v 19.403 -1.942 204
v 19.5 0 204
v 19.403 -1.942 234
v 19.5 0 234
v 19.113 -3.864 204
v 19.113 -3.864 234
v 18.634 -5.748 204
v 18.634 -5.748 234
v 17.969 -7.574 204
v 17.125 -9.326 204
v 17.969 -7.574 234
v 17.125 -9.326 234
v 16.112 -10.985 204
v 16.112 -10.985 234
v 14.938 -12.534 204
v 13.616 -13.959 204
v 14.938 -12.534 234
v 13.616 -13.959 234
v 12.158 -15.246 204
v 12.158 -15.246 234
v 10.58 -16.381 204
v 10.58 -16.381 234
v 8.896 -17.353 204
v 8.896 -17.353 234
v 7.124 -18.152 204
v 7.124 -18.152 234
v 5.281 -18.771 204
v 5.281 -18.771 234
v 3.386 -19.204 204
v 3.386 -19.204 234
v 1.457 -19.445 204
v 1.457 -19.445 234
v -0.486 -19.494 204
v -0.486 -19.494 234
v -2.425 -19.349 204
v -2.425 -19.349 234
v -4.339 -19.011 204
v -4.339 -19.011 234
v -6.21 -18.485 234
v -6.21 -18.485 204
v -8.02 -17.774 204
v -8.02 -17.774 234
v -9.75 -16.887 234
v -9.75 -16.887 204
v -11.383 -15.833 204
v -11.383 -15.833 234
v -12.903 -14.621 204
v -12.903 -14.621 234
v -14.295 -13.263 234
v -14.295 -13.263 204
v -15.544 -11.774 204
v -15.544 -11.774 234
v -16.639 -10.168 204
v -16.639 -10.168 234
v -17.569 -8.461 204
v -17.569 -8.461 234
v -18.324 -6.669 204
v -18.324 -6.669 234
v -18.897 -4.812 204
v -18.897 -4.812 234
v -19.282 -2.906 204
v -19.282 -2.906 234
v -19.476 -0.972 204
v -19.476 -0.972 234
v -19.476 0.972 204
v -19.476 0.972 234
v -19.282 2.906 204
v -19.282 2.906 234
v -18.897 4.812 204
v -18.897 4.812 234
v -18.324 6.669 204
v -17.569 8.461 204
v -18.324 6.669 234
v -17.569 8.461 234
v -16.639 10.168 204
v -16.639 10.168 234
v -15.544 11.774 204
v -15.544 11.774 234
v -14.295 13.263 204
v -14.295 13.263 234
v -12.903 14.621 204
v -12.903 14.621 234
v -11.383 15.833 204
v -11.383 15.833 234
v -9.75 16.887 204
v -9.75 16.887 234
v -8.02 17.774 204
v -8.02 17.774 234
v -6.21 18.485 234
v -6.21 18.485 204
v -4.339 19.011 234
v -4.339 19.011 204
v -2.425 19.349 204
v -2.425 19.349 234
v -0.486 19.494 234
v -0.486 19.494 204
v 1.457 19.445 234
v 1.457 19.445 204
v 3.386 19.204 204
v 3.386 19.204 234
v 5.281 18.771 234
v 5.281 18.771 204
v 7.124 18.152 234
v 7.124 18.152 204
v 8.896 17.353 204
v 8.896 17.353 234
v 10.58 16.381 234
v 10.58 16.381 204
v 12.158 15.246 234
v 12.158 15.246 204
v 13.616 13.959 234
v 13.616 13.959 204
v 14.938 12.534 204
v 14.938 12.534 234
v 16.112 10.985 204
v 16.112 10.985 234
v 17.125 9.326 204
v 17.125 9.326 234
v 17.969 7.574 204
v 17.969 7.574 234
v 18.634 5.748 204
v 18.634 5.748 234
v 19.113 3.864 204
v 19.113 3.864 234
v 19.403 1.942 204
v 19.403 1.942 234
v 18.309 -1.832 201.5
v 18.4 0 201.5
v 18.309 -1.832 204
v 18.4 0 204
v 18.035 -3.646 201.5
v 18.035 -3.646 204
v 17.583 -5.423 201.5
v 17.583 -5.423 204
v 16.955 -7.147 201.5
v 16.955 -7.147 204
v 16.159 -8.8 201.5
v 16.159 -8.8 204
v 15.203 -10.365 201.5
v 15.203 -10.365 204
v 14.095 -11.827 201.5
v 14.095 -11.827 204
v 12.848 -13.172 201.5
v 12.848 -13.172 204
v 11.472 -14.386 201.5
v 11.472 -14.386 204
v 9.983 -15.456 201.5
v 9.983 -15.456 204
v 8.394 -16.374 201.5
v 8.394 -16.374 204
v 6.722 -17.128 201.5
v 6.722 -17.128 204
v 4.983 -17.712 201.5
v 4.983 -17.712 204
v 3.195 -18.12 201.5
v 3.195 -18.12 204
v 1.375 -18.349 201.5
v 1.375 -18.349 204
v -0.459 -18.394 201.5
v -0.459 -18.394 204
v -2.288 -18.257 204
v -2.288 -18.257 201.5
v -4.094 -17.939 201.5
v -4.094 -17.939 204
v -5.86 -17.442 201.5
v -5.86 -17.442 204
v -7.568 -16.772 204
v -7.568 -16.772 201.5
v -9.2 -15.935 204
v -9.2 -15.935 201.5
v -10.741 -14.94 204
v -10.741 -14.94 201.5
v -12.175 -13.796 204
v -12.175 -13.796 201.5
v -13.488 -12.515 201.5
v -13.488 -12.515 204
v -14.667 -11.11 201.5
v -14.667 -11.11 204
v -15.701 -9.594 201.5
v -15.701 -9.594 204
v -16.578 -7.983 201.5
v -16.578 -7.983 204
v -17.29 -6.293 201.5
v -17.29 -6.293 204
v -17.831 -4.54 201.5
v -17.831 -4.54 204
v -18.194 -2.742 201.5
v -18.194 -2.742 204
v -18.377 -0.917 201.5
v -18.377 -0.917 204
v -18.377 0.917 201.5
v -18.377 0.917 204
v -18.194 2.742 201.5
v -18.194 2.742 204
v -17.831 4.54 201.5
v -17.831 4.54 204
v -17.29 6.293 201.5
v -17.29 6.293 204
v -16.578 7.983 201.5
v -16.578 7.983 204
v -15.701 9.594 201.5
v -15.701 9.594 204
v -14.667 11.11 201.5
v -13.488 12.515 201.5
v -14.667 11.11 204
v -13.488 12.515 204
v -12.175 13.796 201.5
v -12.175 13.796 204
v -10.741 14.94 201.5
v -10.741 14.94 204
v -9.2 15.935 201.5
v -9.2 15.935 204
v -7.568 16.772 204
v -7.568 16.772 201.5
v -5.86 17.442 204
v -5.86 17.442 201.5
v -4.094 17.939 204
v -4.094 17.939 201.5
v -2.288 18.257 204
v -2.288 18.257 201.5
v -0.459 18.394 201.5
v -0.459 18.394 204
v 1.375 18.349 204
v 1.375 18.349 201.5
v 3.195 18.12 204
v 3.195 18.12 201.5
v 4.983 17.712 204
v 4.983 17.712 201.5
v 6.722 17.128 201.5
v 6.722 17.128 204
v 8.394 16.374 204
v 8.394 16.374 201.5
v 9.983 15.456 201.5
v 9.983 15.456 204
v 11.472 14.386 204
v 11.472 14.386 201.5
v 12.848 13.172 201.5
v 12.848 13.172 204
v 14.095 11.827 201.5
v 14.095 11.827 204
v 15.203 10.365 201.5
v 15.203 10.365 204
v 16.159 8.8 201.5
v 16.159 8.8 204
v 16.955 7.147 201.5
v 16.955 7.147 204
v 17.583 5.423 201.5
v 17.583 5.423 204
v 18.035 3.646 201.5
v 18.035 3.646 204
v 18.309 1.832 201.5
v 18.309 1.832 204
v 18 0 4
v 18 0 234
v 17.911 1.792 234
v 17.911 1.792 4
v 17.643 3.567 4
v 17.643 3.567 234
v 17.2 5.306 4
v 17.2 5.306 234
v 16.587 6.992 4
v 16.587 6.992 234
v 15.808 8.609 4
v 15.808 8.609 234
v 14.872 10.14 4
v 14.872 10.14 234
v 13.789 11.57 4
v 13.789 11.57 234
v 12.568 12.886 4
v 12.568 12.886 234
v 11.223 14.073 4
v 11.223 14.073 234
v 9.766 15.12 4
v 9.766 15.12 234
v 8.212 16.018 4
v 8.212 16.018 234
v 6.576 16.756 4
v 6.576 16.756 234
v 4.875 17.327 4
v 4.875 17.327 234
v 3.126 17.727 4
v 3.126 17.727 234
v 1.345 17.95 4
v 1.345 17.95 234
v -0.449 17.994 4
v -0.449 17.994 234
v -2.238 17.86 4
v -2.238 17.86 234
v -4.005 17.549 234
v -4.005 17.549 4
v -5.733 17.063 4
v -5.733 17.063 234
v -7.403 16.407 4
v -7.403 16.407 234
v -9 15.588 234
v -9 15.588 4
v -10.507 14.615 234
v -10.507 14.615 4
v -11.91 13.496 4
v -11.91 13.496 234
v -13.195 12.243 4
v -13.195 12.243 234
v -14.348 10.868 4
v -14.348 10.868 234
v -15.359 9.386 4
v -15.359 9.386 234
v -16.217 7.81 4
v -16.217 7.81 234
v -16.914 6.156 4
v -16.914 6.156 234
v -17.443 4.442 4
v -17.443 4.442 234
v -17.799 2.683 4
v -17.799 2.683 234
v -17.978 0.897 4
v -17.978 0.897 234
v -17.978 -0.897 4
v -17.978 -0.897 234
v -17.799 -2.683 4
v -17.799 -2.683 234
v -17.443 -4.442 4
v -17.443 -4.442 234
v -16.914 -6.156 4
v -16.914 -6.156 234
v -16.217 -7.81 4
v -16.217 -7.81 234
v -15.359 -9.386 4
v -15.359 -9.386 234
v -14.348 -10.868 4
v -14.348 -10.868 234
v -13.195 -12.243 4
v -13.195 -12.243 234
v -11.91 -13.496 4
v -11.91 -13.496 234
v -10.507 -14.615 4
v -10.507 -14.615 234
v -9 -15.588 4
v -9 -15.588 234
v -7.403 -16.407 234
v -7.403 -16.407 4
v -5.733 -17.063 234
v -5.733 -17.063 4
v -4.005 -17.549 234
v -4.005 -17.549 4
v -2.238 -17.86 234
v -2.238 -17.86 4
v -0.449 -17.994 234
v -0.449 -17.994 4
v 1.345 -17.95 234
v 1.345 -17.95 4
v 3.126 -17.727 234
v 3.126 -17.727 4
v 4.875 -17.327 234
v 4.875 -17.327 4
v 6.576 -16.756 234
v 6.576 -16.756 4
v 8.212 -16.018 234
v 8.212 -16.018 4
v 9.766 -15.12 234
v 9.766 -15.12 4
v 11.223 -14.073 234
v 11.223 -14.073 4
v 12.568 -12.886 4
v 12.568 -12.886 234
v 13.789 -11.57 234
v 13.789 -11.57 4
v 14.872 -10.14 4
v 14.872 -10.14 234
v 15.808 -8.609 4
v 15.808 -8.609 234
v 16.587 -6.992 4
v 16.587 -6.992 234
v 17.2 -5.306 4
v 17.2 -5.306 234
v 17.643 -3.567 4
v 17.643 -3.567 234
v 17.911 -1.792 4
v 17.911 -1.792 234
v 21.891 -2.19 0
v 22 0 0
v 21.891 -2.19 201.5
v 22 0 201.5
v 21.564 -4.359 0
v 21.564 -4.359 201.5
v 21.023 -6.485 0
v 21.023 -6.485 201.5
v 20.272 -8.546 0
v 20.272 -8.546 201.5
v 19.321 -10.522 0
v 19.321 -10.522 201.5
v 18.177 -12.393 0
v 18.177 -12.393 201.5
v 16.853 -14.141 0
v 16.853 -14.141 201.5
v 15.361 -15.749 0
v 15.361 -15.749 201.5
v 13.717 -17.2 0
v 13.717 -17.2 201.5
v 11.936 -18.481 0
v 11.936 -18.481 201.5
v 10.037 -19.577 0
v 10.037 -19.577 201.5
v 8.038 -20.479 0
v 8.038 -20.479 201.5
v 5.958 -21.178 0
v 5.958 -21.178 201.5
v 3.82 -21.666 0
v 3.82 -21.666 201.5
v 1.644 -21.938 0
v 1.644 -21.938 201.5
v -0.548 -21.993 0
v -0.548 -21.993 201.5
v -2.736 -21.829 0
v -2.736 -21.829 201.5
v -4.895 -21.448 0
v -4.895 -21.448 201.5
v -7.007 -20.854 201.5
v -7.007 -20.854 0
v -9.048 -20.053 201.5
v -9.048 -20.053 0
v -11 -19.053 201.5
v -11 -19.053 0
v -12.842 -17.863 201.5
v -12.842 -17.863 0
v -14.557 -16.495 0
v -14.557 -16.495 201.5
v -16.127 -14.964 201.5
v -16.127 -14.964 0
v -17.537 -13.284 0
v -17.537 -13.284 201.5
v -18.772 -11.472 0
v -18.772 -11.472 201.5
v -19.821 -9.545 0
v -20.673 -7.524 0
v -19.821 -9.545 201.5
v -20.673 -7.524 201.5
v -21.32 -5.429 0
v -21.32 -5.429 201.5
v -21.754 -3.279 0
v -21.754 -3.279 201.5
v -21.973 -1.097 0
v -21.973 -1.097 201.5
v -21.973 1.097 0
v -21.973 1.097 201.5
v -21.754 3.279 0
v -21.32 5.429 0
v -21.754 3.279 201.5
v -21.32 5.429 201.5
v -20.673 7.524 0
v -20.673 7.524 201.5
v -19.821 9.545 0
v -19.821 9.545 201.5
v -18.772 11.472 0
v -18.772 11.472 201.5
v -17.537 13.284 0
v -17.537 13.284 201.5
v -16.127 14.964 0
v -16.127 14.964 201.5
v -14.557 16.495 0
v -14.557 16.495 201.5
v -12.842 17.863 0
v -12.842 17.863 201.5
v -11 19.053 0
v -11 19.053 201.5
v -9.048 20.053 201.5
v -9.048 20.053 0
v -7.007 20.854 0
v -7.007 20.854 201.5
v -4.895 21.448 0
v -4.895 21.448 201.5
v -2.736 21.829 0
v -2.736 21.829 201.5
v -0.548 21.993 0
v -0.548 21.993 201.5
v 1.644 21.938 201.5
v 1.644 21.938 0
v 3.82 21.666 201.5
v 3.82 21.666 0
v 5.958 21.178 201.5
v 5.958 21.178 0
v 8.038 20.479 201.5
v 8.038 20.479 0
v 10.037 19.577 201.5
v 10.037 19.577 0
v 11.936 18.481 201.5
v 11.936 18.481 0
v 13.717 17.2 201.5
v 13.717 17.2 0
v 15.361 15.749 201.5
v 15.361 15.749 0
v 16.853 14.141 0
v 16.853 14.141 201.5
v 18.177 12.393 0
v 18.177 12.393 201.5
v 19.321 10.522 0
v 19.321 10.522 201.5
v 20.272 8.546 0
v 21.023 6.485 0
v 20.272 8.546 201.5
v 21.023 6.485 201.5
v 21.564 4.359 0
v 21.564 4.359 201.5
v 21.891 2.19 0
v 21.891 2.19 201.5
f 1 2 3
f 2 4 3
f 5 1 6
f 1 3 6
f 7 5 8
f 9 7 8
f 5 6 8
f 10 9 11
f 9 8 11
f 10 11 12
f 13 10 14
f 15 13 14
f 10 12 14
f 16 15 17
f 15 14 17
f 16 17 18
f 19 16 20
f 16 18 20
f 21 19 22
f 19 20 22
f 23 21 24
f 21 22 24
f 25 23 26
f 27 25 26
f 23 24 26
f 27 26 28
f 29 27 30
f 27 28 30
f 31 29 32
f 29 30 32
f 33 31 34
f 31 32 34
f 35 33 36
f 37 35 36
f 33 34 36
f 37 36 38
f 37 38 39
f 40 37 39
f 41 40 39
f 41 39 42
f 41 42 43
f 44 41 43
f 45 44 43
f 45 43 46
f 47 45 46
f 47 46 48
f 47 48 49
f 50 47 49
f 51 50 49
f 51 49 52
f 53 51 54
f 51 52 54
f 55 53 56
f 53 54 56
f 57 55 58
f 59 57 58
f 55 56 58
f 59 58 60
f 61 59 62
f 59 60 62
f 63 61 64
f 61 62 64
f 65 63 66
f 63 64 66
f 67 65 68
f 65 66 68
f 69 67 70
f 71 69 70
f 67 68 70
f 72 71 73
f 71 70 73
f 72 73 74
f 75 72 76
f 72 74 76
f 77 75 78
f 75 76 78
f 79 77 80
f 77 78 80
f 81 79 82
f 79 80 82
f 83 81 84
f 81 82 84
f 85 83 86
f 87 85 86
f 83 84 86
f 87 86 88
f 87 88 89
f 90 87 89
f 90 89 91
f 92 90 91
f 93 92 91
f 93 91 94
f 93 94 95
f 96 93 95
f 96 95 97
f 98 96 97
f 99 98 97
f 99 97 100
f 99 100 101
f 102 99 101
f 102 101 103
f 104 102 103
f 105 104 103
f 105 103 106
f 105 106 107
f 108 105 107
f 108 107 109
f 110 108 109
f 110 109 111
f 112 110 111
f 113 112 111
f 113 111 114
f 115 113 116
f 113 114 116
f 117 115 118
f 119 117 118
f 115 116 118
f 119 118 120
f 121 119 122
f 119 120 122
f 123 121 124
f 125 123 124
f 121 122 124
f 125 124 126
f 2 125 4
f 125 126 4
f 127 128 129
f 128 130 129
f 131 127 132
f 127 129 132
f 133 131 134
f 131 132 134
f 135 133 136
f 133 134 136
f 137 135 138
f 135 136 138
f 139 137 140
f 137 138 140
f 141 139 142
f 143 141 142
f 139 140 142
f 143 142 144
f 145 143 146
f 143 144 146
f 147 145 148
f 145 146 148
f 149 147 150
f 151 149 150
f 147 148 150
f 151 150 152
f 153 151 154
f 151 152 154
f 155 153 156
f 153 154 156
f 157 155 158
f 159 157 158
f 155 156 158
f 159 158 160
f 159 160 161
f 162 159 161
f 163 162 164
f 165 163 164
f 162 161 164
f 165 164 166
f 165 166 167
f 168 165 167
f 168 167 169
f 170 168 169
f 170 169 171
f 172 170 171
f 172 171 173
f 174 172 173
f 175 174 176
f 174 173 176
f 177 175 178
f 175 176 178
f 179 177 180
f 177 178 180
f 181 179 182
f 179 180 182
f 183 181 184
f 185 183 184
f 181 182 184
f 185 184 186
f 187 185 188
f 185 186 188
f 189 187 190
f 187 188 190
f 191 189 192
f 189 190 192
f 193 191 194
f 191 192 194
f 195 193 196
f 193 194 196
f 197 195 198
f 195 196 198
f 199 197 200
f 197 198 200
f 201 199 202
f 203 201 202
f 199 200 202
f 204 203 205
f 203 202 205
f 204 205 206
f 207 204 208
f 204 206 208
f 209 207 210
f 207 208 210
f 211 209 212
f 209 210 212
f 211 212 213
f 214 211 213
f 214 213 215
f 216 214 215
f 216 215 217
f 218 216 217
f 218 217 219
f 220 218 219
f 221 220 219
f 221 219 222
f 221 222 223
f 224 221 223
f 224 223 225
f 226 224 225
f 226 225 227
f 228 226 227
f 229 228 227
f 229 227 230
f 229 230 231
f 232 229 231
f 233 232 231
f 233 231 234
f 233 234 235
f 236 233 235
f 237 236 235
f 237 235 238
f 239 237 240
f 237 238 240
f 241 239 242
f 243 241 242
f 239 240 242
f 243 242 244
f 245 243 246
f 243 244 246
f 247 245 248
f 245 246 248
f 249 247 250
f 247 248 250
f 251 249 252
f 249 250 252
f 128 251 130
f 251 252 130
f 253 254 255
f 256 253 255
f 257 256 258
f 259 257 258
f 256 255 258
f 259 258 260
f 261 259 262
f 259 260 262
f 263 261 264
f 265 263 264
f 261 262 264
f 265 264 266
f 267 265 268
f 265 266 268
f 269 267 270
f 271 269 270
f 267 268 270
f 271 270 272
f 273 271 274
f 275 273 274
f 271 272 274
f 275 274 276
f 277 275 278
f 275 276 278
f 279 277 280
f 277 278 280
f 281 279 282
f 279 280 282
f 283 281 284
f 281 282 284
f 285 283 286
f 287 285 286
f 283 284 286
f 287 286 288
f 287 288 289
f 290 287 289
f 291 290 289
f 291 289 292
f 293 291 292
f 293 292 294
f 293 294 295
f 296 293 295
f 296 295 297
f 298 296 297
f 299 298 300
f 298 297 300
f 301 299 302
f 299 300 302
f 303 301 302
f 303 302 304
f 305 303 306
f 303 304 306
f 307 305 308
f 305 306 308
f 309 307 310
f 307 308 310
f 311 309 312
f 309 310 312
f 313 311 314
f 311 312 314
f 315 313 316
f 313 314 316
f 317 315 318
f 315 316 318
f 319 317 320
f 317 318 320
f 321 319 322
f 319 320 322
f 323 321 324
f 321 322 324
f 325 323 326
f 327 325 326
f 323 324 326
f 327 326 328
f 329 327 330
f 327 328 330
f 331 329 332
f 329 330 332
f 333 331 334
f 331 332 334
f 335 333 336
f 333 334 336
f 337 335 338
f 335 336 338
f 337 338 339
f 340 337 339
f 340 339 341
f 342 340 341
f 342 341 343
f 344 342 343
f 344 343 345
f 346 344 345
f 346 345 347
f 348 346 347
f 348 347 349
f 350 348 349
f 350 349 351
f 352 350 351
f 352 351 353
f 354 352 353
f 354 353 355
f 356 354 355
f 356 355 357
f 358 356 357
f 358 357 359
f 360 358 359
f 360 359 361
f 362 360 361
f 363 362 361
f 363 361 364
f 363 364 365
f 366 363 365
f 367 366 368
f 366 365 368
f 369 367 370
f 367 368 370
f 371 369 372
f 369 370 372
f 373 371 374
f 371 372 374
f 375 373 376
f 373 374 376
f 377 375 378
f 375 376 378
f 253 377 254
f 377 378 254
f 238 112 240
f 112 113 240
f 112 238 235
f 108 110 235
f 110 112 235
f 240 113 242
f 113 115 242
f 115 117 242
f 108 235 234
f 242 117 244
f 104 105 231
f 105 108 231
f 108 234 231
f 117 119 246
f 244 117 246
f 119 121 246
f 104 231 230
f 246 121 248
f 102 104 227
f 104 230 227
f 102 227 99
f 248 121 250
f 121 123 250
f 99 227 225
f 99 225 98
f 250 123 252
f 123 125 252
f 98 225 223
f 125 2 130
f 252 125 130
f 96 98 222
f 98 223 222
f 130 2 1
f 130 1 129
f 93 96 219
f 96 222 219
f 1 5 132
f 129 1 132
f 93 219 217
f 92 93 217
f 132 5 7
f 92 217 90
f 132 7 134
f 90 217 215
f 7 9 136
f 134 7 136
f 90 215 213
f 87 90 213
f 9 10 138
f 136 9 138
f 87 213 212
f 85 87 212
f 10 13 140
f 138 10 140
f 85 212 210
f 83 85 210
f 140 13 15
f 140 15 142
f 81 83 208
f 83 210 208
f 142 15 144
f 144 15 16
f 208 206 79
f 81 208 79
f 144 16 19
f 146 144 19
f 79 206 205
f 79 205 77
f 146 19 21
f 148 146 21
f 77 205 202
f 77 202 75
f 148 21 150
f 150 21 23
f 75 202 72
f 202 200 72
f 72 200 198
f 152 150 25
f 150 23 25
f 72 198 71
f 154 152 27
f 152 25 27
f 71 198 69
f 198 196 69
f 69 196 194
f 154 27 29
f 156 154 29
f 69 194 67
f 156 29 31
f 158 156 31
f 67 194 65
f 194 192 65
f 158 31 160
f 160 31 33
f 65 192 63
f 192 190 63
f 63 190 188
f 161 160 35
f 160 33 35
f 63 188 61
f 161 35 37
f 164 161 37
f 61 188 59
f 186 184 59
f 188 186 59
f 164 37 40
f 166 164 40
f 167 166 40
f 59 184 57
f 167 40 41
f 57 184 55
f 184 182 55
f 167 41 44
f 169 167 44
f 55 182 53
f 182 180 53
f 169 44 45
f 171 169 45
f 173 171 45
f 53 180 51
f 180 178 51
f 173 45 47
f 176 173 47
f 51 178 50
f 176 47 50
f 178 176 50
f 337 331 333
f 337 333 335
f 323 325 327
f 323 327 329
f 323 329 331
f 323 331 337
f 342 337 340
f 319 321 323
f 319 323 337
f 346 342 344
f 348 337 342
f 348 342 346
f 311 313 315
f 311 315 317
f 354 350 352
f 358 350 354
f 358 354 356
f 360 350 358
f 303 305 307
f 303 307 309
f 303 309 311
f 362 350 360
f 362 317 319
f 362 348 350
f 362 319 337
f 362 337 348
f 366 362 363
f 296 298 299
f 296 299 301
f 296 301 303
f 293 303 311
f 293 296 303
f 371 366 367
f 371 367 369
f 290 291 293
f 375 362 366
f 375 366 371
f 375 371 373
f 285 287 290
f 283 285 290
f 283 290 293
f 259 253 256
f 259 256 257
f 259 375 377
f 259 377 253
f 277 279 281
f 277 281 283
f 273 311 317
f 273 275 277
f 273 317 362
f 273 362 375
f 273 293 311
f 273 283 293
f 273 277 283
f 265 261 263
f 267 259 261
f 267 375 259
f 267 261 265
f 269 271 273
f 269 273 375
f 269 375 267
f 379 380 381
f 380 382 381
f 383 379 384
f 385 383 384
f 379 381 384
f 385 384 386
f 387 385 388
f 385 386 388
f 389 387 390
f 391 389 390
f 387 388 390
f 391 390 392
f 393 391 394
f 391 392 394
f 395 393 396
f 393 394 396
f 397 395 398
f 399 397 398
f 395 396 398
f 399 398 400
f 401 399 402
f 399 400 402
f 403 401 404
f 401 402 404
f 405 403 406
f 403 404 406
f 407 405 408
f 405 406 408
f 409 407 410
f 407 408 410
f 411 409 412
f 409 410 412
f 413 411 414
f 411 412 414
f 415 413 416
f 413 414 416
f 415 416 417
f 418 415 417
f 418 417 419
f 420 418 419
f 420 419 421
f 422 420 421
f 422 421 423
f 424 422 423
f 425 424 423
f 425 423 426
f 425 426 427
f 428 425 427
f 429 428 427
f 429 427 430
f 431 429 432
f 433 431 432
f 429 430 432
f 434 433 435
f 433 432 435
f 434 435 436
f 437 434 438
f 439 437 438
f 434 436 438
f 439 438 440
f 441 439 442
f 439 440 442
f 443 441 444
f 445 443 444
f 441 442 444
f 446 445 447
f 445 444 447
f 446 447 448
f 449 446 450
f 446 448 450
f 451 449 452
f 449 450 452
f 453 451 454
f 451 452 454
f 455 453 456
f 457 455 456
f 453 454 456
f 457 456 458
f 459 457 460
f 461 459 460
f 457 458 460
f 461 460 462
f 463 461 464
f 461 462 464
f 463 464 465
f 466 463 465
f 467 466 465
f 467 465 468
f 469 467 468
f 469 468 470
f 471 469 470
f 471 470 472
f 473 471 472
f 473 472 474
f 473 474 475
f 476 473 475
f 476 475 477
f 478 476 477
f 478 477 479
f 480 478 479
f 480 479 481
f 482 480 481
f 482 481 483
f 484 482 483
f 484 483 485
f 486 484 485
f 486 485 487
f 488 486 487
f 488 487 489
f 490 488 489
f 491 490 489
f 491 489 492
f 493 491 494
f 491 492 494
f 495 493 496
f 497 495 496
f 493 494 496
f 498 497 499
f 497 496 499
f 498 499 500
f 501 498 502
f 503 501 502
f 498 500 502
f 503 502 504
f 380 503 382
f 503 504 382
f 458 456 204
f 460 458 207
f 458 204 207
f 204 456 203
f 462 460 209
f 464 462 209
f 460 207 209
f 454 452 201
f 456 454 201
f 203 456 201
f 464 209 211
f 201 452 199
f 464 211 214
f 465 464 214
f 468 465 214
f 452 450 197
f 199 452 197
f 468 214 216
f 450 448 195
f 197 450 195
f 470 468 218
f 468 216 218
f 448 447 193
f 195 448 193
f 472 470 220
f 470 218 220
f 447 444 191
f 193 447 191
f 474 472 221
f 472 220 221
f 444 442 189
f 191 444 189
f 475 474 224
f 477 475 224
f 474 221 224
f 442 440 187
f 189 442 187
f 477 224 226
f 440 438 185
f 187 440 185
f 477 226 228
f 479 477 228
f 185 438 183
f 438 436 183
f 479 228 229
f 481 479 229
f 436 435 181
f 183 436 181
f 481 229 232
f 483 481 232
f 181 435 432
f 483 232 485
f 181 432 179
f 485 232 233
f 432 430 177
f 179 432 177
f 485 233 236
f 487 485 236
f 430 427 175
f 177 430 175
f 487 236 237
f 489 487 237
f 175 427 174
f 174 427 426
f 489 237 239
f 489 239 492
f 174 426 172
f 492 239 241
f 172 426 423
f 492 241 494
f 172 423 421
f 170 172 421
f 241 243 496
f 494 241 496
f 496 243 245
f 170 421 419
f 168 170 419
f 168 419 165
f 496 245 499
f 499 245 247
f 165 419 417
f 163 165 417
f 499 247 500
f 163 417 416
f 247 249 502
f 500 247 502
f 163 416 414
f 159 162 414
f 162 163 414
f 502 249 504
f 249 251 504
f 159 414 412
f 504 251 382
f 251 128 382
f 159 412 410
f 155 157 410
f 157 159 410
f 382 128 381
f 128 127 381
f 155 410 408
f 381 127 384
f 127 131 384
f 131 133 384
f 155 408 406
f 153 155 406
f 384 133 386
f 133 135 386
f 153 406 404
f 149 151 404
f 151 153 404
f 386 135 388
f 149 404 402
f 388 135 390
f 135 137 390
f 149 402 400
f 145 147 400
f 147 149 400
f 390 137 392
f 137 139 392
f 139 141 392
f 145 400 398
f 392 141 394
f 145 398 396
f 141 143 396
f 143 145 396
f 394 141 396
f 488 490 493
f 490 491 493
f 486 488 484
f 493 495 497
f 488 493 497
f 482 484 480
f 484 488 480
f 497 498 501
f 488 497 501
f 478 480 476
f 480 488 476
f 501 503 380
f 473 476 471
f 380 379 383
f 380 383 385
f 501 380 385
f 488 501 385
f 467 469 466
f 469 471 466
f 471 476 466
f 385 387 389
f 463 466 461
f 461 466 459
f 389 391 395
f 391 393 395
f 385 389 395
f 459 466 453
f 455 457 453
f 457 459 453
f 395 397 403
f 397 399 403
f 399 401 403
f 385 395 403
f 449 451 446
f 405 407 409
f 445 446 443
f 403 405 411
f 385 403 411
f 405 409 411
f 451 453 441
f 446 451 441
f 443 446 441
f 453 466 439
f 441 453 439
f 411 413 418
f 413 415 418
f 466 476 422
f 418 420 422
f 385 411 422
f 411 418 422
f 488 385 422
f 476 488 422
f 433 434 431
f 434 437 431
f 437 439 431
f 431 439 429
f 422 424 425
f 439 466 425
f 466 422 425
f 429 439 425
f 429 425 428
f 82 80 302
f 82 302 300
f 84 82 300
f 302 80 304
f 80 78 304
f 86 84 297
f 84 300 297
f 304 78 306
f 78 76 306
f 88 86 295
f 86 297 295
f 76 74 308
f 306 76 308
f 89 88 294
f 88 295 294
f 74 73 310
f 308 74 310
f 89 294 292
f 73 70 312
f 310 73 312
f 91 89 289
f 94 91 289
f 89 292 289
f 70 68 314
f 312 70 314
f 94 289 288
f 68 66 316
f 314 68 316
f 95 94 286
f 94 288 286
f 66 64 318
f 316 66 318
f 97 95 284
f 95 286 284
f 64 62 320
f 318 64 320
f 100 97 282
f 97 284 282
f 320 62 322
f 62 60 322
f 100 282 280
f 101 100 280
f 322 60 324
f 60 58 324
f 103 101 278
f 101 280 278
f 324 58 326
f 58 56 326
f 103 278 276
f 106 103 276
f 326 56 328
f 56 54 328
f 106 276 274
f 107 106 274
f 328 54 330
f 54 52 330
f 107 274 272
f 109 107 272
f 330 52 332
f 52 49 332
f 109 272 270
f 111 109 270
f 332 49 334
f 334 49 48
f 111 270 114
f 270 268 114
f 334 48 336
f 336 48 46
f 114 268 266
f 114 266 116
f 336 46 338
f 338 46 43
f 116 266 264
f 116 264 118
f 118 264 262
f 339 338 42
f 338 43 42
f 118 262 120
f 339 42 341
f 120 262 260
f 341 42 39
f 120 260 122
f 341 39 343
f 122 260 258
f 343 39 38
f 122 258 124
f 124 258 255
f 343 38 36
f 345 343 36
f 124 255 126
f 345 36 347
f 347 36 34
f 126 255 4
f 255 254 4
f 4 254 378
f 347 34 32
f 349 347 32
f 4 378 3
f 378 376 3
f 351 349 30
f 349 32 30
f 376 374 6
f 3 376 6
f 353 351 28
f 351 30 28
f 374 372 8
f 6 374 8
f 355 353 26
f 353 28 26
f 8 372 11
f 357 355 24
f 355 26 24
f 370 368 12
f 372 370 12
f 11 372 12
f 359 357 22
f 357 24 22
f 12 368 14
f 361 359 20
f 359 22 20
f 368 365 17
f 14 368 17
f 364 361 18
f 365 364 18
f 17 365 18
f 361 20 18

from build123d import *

# Parameters (mm, degrees)
F3_R     = 18
F4_DEPTH = 230


with BuildPart() as f1:
    # F0 (on Front) → F1 (revolve)
    with BuildSketch(Plane.XZ):
        Polygon((0, 234), (0, 0), (22, 0), (22, 201.5), (18.4, 201.5), (18.4, 204), (19.5, 204), (19.5, 234), align=None)
    revolve(axis=Axis((0, 0, 117), (0, 0, -1)))

    # F3 (on face) → F4 (cut)
    with BuildSketch(Plane.XY.offset(234)):
        Circle(F3_R)
    extrude(amount=-F4_DEPTH, mode=Mode.SUBTRACT)


solid = f1.part
